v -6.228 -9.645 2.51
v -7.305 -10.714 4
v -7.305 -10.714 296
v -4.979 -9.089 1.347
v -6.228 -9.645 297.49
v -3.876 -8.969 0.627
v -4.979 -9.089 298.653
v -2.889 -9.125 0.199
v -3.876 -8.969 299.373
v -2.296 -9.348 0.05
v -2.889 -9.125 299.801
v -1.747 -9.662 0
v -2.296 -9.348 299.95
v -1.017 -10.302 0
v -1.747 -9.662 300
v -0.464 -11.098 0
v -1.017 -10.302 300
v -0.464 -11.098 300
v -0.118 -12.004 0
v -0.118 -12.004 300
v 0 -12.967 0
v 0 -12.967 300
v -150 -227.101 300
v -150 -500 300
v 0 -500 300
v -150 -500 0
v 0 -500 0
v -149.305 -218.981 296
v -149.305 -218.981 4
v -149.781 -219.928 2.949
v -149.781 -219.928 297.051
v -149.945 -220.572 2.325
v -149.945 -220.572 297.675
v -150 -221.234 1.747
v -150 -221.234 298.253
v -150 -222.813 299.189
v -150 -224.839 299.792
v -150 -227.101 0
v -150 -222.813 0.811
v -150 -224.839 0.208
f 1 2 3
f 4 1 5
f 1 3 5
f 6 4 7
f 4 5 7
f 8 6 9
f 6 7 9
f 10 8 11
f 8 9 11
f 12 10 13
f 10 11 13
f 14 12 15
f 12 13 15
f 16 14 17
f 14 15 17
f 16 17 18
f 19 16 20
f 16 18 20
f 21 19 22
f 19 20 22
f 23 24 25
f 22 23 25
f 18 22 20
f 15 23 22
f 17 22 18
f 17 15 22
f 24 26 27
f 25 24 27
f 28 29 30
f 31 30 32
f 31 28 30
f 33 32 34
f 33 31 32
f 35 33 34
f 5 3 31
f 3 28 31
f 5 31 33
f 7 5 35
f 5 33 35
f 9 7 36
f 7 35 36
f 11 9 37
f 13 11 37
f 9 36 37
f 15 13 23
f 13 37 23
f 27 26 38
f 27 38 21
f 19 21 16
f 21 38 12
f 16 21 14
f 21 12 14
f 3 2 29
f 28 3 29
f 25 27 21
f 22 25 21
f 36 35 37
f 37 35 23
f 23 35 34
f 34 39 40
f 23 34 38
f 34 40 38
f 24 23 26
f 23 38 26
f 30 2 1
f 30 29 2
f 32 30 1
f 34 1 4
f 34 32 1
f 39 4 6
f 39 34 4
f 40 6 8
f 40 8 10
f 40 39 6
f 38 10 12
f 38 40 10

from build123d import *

# Parameters (mm, degrees)
EXTRUDE_1_DEPTH = 300
FILLET_1_R      = 4


with BuildPart() as part:
    # 草圖1 → 填料-伸長1 (new body)
    with BuildSketch(Plane.XY):
        Polygon((0, 0), (-150, -220), (-150, -500), (0, -500), align=None)
    extrude(amount=EXTRUDE_1_DEPTH)

    # 圓角1
    fillet_1_edges = [part.edges().sort_by_distance(p)[0] for p in [
        (-75, -110, 0),
        (-75, -110, 300),
        (-150, -220, 150),
        (0, 0, 150),
    ]]
    fillet(fillet_1_edges, radius=FILLET_1_R)


solid = part.part
